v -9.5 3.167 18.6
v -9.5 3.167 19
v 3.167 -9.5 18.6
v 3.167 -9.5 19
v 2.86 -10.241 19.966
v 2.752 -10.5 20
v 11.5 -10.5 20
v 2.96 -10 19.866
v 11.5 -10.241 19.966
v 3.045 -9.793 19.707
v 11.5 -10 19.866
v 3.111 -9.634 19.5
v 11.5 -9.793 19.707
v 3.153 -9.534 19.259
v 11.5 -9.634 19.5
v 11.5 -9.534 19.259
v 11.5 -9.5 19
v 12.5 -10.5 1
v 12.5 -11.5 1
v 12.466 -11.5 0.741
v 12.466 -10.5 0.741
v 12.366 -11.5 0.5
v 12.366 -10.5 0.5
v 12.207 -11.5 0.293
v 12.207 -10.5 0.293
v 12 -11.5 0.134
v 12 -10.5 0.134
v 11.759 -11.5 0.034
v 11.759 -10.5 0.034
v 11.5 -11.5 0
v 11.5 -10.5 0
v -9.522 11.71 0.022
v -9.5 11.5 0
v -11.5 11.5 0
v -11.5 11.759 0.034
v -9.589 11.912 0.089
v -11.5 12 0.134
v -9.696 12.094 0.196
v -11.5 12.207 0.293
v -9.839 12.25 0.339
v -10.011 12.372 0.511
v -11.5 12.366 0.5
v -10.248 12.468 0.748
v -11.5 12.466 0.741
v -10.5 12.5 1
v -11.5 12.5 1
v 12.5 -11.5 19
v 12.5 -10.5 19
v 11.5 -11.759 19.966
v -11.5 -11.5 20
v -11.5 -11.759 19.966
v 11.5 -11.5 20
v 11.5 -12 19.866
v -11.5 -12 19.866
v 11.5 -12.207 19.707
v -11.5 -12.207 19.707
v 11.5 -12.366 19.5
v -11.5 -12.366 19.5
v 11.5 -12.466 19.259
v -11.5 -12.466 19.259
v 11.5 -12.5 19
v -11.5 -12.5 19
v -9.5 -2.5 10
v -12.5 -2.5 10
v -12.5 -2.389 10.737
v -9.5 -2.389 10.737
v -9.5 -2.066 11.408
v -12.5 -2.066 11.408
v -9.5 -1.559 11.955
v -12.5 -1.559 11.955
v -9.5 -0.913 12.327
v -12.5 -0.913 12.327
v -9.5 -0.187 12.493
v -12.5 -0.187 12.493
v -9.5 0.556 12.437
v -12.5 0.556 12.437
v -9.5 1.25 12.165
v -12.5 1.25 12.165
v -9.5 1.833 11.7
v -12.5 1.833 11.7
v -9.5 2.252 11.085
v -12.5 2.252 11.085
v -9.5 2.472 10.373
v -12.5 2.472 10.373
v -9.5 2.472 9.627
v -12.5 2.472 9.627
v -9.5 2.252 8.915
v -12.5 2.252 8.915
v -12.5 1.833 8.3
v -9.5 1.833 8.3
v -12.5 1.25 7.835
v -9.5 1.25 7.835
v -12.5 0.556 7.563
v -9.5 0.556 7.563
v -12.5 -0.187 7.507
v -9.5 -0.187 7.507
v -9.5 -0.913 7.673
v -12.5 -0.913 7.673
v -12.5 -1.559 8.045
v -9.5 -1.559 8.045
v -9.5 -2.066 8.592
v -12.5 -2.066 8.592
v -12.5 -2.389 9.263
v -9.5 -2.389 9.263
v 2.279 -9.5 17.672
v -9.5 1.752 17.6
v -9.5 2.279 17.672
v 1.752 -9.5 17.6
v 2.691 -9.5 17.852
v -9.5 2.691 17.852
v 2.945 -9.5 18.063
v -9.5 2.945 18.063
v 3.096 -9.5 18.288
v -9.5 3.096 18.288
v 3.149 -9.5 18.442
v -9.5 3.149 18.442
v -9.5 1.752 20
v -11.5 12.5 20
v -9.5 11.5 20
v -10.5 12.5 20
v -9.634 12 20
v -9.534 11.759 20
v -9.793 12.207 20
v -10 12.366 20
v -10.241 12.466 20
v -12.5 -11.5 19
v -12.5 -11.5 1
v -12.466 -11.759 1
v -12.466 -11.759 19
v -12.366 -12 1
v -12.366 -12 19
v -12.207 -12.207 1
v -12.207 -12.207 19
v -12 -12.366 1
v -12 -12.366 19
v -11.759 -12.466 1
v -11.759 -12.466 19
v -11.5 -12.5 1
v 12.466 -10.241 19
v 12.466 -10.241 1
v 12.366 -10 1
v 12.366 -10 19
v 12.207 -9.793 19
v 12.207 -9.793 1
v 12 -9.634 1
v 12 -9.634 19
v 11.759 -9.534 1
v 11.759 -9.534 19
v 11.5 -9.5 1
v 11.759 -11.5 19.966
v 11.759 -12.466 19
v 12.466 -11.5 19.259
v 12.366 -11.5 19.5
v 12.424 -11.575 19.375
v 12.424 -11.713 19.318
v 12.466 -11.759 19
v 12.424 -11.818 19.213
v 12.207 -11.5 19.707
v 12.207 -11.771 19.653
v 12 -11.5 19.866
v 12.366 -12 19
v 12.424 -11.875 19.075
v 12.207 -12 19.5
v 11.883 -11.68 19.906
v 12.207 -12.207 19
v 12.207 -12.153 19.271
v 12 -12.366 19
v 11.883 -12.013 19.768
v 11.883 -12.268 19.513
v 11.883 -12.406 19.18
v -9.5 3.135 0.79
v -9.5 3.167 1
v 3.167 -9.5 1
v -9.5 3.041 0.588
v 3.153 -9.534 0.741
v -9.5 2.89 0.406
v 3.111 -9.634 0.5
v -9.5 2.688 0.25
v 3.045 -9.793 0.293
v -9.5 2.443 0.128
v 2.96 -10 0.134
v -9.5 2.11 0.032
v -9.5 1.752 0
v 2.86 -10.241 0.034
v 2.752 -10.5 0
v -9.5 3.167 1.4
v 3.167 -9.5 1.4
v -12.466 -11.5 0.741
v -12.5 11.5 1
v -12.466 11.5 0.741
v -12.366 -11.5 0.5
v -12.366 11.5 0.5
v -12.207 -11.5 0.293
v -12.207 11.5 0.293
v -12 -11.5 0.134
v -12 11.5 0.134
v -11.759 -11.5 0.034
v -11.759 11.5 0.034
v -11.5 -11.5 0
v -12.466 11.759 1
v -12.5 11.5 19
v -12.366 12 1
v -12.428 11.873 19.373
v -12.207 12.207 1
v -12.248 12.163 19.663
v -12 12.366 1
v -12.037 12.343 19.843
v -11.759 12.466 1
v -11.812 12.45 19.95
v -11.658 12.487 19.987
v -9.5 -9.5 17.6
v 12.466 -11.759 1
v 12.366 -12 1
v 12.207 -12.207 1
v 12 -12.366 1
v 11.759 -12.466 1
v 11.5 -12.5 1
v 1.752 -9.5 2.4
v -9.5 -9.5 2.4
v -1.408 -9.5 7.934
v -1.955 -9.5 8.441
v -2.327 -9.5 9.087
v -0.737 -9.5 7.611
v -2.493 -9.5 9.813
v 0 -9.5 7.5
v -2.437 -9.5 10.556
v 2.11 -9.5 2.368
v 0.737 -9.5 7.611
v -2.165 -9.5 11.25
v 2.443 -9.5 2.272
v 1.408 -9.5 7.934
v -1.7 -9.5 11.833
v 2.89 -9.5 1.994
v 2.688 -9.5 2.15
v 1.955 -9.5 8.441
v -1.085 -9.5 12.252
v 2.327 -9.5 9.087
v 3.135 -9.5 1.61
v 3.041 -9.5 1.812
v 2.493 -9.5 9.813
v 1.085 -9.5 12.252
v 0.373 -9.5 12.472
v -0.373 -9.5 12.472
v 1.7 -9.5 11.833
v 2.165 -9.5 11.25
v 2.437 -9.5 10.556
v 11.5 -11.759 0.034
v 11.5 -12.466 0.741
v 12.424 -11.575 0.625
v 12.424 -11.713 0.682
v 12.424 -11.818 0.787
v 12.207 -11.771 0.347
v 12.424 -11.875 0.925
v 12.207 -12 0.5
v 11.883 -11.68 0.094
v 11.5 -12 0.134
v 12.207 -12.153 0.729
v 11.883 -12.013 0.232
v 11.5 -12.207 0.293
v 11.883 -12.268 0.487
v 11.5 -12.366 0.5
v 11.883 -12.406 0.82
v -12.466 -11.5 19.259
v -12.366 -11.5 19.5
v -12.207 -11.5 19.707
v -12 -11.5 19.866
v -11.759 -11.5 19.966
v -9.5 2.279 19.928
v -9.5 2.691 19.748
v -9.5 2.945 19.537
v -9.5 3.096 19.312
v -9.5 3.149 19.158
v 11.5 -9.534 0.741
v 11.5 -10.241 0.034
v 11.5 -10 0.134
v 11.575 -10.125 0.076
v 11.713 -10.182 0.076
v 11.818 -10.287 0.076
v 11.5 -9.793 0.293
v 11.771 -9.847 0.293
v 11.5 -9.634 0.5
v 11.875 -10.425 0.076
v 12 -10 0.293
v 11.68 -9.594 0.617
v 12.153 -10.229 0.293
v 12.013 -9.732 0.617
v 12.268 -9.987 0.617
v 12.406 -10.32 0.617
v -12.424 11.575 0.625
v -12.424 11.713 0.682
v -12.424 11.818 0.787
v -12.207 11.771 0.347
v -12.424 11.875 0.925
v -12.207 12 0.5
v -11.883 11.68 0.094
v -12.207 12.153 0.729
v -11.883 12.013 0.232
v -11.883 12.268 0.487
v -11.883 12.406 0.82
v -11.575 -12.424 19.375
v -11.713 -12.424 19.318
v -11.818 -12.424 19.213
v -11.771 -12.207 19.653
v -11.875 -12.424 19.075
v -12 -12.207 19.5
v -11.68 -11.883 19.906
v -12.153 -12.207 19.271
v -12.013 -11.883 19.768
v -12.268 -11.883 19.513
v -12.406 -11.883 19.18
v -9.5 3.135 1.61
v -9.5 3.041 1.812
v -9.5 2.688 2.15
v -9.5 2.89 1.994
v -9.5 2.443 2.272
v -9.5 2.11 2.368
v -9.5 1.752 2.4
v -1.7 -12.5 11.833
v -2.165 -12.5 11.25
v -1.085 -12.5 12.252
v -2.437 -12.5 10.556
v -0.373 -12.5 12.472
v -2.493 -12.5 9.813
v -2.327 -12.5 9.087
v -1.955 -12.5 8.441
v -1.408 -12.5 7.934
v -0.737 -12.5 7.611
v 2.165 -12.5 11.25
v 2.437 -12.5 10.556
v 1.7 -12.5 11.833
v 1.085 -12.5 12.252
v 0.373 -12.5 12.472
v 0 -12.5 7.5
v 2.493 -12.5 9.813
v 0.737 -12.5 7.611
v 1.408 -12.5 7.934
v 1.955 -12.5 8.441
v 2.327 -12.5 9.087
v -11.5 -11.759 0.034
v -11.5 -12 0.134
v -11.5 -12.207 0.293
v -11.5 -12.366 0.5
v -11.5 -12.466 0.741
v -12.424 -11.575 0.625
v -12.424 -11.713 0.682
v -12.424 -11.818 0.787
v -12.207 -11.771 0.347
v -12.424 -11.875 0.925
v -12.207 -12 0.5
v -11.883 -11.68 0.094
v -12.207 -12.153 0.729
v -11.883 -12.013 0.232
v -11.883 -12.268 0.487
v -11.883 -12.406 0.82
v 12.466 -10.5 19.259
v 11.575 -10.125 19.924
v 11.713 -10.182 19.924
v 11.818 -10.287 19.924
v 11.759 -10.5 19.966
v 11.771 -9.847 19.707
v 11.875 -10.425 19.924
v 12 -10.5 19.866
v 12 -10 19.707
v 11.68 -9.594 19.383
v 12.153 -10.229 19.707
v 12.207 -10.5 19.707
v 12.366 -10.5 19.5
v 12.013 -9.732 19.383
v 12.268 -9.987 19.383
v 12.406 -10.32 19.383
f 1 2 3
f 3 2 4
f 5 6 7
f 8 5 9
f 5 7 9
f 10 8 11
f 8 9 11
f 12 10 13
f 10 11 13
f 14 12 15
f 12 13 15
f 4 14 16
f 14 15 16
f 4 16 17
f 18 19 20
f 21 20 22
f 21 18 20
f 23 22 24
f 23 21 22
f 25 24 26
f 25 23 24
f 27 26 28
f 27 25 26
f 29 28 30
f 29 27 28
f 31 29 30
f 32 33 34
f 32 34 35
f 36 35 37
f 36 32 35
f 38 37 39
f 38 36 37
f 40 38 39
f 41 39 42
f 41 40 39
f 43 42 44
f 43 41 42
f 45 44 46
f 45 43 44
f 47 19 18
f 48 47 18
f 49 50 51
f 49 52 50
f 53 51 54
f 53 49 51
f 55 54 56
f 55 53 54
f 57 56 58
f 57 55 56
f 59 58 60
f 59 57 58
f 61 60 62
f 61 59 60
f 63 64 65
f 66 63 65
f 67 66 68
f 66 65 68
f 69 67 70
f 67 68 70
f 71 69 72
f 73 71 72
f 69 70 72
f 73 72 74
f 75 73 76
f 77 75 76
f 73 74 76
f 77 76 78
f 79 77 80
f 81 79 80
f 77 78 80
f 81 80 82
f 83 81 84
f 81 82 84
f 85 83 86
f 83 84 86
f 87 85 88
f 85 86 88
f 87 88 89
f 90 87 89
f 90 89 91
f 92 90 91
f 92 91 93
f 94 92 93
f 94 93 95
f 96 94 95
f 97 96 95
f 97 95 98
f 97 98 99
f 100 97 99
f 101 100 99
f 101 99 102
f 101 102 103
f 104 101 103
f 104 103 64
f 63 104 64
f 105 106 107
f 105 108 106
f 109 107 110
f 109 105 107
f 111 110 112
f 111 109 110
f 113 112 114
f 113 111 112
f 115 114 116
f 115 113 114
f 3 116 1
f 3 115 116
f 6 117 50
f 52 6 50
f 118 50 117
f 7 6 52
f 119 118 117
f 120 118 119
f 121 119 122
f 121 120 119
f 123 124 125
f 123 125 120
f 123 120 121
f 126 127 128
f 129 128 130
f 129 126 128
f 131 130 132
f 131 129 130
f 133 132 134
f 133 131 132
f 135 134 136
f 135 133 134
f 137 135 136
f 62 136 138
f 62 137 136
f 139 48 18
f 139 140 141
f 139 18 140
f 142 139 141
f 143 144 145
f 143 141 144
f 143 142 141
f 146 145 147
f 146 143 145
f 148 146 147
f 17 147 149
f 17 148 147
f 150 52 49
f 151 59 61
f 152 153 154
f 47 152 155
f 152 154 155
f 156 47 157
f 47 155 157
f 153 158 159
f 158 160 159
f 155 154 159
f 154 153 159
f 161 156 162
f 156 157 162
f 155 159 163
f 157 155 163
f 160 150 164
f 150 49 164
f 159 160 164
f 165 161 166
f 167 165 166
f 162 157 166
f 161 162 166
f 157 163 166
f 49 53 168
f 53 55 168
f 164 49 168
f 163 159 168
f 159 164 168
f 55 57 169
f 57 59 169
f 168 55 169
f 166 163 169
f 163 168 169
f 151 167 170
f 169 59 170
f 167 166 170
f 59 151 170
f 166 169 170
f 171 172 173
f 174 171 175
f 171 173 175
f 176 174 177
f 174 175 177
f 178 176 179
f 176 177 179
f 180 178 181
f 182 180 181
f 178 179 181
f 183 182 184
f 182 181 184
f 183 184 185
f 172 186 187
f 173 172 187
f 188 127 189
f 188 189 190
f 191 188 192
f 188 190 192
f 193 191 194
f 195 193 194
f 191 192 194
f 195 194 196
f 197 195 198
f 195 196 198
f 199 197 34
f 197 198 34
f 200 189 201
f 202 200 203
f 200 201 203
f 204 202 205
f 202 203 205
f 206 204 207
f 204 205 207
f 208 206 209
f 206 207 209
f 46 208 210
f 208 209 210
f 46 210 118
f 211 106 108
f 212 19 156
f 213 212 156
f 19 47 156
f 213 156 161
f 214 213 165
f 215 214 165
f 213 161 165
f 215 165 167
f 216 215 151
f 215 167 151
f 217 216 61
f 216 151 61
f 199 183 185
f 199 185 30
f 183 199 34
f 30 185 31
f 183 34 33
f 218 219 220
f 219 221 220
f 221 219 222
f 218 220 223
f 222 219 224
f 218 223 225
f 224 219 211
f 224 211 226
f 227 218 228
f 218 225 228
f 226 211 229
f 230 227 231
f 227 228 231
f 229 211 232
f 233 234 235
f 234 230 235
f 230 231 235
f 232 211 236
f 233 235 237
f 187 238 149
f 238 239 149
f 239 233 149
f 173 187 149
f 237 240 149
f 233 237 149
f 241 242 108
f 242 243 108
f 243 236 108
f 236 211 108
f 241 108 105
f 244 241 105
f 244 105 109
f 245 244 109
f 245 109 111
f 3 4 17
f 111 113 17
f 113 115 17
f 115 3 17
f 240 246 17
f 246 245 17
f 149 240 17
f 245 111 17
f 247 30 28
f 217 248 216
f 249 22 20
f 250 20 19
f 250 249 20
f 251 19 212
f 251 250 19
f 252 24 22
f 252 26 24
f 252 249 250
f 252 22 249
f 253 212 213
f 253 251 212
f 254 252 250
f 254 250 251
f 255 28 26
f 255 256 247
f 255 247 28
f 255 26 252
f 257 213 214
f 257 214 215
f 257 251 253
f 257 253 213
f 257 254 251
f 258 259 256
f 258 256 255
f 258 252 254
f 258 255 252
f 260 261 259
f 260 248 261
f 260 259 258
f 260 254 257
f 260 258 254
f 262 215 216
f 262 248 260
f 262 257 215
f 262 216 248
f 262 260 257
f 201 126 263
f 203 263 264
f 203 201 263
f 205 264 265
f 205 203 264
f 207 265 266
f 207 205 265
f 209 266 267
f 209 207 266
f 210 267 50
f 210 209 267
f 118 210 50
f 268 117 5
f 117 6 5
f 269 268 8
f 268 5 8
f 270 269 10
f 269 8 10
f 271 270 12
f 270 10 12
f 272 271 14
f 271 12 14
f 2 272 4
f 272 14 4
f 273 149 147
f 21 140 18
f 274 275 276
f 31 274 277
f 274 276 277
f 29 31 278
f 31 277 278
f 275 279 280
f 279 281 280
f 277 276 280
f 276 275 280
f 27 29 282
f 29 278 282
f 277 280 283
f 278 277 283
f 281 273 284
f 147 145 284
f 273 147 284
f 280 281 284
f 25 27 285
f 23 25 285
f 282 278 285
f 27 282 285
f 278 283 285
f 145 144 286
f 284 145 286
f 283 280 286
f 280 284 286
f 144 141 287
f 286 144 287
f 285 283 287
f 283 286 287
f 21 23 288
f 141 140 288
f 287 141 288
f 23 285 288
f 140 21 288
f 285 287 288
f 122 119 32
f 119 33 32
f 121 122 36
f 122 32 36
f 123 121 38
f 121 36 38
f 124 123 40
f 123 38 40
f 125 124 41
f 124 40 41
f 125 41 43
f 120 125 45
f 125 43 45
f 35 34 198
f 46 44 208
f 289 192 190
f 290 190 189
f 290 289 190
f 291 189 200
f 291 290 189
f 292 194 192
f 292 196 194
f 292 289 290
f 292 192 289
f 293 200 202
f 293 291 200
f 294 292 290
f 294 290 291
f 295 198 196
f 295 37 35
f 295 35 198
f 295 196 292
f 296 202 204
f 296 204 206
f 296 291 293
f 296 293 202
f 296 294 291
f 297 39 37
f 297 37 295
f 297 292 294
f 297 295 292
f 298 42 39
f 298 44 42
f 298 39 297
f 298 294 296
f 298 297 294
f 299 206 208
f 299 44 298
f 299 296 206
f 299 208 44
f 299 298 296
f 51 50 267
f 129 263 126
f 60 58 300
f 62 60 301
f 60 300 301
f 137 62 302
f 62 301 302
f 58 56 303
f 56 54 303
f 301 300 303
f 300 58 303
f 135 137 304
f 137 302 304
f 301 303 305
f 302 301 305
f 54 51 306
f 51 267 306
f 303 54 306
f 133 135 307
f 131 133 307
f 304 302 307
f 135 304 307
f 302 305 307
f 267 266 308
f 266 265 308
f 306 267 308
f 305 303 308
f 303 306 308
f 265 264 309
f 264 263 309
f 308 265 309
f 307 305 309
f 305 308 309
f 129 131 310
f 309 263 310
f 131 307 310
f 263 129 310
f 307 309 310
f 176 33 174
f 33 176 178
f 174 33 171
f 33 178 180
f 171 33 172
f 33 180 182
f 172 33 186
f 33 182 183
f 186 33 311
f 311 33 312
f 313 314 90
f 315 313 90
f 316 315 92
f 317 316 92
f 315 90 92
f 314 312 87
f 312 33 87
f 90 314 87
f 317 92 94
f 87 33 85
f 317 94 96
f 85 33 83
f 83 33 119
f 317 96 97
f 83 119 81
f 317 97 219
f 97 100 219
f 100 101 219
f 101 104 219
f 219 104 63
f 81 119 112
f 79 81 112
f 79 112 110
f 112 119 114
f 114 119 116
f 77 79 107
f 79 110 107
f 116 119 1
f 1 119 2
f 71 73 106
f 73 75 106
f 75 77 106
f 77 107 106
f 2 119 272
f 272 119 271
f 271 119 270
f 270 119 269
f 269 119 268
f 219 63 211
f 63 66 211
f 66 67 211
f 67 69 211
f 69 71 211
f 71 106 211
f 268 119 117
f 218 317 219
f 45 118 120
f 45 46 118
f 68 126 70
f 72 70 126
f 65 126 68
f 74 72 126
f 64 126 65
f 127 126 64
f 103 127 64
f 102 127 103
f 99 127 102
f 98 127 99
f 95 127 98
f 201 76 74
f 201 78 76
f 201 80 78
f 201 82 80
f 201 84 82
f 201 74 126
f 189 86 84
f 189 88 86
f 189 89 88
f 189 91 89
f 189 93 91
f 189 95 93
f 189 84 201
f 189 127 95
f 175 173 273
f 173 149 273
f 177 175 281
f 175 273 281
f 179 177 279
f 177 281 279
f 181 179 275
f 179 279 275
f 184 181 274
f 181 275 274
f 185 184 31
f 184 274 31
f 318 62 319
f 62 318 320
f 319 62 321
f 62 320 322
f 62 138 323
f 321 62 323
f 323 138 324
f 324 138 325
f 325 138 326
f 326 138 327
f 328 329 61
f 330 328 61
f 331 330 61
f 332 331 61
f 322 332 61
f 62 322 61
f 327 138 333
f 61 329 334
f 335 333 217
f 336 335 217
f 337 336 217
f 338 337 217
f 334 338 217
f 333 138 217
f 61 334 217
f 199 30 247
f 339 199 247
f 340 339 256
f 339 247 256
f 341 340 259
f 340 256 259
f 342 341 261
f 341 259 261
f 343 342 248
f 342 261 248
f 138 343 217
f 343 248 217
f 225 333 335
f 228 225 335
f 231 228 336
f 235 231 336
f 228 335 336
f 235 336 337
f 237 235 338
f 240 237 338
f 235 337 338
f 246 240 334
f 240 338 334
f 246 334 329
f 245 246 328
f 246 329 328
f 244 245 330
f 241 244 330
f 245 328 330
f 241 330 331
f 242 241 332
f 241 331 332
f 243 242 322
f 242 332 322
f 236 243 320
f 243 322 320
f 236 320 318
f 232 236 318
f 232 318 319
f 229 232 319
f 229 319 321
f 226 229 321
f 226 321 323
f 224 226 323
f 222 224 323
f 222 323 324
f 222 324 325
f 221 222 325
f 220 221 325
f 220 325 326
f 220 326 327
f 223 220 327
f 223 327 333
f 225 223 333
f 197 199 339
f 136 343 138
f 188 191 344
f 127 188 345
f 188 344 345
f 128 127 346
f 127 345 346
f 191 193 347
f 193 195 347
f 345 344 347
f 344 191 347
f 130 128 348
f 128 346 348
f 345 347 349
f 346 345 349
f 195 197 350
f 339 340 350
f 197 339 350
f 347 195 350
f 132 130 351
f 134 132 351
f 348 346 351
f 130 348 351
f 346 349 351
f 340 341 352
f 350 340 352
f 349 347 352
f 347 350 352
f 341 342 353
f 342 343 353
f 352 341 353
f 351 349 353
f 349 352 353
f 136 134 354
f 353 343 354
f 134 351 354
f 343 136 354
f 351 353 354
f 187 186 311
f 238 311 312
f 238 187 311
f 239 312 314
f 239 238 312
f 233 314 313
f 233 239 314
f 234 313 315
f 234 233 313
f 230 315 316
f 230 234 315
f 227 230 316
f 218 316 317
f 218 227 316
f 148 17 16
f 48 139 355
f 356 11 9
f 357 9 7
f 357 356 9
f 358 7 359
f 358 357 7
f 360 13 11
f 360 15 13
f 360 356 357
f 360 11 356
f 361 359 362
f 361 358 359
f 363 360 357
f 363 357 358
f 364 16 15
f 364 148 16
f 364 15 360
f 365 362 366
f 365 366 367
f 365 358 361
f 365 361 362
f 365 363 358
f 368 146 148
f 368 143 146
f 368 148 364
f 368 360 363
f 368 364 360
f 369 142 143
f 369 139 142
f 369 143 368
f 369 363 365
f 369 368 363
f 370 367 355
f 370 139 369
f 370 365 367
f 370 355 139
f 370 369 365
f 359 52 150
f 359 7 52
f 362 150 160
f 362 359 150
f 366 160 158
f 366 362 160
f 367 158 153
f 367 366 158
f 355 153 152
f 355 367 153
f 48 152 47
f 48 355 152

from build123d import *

# Parameters (mm, degrees)
SKETCH1_W           = 25
SKETCH1_H           = 25
BOSS_EXTRUDE1_DEPTH = 20
CUT_EXTRUDE3_START  = -2.4
SKETCH2_W           = 22
SKETCH2_H           = 22
CUT_EXTRUDE3_DEPTH  = 15.2
CUT_EXTRUDE4_DEPTH  = 27.69269563
FILLET1_R           = 1
SKETCH5_R           = 2.5
CUT_EXTRUDE5_DEPTH  = 35.369317712
SKETCH6_R           = 2.5
CUT_EXTRUDE6_DEPTH  = 35.369317712


with BuildPart() as part:
    # Sketch1 → Boss-Extrude1 (new body)
    with BuildSketch(Plane.XY):
        Rectangle(SKETCH1_W, SKETCH1_H)
    extrude(amount=BOSS_EXTRUDE1_DEPTH)

    # Sketch2 → Cut-Extrude3 (cut)
    with BuildSketch(Plane.XY.offset(20).offset(CUT_EXTRUDE3_START)):
        with Locations((1.5, 1.5)):
            Rectangle(SKETCH2_W, SKETCH2_H)
    extrude(amount=-CUT_EXTRUDE3_DEPTH, mode=Mode.SUBTRACT)

    # Sketch3 → Cut-Extrude4 (cut, through all)
    with BuildSketch(Plane.XY.offset(20)):
        Polygon((-9.5, 3.166666667), (3.166666667, -9.5), (12.5, -9.5), (12.5, 12.5), (-9.5, 12.5), align=None)
    extrude(amount=-CUT_EXTRUDE4_DEPTH, mode=Mode.SUBTRACT)

    # Fillet1
    fillet1_edges = [part.edges().sort_by_distance(p)[0] for p in [
        (-12.5, 0, 20),
        (0, -12.5, 20),
        (12.5, -9.5, 10),
        (-9.5, 12.5, 10),
        (-3.166666667, -3.166666667, 17.6),
        (-11, 12.5, 0),
        (-3.166666667, -3.166666667, 2.4),
        (-3.166666667, -3.166666667, 0),
        (7.833333333, -9.5, 20),
        (7.833333333, -9.5, 0),
        (-3.166666667, -3.166666667, 20),
        (12.5, -11, 20),
        (0, -12.5, 0),
        (-12.5, 0, 0),
        (12.5, -11, 0),
        (12.5, -12.5, 10),
        (-12.5, -12.5, 10),
        (-12.5, 12.5, 10),
    ]]
    fillet(fillet1_edges, radius=FILLET1_R)

    # Sketch5 → Cut-Extrude5 (cut, through all)
    with BuildSketch(Plane.XZ.offset(12.5)):
        with Locations(Location((0, 10, 0), (0, 0, 270))):
            Circle(SKETCH5_R)
    extrude(amount=-CUT_EXTRUDE5_DEPTH, mode=Mode.SUBTRACT)

    # Sketch6 → Cut-Extrude6 (cut, through all)
    with BuildSketch(Plane.ZY.offset(12.5)):
        with Locations(Location((10, 0, 0), (0, 0, 270))):
            Circle(SKETCH6_R)
    extrude(amount=-CUT_EXTRUDE6_DEPTH, mode=Mode.SUBTRACT)


solid = part.part
